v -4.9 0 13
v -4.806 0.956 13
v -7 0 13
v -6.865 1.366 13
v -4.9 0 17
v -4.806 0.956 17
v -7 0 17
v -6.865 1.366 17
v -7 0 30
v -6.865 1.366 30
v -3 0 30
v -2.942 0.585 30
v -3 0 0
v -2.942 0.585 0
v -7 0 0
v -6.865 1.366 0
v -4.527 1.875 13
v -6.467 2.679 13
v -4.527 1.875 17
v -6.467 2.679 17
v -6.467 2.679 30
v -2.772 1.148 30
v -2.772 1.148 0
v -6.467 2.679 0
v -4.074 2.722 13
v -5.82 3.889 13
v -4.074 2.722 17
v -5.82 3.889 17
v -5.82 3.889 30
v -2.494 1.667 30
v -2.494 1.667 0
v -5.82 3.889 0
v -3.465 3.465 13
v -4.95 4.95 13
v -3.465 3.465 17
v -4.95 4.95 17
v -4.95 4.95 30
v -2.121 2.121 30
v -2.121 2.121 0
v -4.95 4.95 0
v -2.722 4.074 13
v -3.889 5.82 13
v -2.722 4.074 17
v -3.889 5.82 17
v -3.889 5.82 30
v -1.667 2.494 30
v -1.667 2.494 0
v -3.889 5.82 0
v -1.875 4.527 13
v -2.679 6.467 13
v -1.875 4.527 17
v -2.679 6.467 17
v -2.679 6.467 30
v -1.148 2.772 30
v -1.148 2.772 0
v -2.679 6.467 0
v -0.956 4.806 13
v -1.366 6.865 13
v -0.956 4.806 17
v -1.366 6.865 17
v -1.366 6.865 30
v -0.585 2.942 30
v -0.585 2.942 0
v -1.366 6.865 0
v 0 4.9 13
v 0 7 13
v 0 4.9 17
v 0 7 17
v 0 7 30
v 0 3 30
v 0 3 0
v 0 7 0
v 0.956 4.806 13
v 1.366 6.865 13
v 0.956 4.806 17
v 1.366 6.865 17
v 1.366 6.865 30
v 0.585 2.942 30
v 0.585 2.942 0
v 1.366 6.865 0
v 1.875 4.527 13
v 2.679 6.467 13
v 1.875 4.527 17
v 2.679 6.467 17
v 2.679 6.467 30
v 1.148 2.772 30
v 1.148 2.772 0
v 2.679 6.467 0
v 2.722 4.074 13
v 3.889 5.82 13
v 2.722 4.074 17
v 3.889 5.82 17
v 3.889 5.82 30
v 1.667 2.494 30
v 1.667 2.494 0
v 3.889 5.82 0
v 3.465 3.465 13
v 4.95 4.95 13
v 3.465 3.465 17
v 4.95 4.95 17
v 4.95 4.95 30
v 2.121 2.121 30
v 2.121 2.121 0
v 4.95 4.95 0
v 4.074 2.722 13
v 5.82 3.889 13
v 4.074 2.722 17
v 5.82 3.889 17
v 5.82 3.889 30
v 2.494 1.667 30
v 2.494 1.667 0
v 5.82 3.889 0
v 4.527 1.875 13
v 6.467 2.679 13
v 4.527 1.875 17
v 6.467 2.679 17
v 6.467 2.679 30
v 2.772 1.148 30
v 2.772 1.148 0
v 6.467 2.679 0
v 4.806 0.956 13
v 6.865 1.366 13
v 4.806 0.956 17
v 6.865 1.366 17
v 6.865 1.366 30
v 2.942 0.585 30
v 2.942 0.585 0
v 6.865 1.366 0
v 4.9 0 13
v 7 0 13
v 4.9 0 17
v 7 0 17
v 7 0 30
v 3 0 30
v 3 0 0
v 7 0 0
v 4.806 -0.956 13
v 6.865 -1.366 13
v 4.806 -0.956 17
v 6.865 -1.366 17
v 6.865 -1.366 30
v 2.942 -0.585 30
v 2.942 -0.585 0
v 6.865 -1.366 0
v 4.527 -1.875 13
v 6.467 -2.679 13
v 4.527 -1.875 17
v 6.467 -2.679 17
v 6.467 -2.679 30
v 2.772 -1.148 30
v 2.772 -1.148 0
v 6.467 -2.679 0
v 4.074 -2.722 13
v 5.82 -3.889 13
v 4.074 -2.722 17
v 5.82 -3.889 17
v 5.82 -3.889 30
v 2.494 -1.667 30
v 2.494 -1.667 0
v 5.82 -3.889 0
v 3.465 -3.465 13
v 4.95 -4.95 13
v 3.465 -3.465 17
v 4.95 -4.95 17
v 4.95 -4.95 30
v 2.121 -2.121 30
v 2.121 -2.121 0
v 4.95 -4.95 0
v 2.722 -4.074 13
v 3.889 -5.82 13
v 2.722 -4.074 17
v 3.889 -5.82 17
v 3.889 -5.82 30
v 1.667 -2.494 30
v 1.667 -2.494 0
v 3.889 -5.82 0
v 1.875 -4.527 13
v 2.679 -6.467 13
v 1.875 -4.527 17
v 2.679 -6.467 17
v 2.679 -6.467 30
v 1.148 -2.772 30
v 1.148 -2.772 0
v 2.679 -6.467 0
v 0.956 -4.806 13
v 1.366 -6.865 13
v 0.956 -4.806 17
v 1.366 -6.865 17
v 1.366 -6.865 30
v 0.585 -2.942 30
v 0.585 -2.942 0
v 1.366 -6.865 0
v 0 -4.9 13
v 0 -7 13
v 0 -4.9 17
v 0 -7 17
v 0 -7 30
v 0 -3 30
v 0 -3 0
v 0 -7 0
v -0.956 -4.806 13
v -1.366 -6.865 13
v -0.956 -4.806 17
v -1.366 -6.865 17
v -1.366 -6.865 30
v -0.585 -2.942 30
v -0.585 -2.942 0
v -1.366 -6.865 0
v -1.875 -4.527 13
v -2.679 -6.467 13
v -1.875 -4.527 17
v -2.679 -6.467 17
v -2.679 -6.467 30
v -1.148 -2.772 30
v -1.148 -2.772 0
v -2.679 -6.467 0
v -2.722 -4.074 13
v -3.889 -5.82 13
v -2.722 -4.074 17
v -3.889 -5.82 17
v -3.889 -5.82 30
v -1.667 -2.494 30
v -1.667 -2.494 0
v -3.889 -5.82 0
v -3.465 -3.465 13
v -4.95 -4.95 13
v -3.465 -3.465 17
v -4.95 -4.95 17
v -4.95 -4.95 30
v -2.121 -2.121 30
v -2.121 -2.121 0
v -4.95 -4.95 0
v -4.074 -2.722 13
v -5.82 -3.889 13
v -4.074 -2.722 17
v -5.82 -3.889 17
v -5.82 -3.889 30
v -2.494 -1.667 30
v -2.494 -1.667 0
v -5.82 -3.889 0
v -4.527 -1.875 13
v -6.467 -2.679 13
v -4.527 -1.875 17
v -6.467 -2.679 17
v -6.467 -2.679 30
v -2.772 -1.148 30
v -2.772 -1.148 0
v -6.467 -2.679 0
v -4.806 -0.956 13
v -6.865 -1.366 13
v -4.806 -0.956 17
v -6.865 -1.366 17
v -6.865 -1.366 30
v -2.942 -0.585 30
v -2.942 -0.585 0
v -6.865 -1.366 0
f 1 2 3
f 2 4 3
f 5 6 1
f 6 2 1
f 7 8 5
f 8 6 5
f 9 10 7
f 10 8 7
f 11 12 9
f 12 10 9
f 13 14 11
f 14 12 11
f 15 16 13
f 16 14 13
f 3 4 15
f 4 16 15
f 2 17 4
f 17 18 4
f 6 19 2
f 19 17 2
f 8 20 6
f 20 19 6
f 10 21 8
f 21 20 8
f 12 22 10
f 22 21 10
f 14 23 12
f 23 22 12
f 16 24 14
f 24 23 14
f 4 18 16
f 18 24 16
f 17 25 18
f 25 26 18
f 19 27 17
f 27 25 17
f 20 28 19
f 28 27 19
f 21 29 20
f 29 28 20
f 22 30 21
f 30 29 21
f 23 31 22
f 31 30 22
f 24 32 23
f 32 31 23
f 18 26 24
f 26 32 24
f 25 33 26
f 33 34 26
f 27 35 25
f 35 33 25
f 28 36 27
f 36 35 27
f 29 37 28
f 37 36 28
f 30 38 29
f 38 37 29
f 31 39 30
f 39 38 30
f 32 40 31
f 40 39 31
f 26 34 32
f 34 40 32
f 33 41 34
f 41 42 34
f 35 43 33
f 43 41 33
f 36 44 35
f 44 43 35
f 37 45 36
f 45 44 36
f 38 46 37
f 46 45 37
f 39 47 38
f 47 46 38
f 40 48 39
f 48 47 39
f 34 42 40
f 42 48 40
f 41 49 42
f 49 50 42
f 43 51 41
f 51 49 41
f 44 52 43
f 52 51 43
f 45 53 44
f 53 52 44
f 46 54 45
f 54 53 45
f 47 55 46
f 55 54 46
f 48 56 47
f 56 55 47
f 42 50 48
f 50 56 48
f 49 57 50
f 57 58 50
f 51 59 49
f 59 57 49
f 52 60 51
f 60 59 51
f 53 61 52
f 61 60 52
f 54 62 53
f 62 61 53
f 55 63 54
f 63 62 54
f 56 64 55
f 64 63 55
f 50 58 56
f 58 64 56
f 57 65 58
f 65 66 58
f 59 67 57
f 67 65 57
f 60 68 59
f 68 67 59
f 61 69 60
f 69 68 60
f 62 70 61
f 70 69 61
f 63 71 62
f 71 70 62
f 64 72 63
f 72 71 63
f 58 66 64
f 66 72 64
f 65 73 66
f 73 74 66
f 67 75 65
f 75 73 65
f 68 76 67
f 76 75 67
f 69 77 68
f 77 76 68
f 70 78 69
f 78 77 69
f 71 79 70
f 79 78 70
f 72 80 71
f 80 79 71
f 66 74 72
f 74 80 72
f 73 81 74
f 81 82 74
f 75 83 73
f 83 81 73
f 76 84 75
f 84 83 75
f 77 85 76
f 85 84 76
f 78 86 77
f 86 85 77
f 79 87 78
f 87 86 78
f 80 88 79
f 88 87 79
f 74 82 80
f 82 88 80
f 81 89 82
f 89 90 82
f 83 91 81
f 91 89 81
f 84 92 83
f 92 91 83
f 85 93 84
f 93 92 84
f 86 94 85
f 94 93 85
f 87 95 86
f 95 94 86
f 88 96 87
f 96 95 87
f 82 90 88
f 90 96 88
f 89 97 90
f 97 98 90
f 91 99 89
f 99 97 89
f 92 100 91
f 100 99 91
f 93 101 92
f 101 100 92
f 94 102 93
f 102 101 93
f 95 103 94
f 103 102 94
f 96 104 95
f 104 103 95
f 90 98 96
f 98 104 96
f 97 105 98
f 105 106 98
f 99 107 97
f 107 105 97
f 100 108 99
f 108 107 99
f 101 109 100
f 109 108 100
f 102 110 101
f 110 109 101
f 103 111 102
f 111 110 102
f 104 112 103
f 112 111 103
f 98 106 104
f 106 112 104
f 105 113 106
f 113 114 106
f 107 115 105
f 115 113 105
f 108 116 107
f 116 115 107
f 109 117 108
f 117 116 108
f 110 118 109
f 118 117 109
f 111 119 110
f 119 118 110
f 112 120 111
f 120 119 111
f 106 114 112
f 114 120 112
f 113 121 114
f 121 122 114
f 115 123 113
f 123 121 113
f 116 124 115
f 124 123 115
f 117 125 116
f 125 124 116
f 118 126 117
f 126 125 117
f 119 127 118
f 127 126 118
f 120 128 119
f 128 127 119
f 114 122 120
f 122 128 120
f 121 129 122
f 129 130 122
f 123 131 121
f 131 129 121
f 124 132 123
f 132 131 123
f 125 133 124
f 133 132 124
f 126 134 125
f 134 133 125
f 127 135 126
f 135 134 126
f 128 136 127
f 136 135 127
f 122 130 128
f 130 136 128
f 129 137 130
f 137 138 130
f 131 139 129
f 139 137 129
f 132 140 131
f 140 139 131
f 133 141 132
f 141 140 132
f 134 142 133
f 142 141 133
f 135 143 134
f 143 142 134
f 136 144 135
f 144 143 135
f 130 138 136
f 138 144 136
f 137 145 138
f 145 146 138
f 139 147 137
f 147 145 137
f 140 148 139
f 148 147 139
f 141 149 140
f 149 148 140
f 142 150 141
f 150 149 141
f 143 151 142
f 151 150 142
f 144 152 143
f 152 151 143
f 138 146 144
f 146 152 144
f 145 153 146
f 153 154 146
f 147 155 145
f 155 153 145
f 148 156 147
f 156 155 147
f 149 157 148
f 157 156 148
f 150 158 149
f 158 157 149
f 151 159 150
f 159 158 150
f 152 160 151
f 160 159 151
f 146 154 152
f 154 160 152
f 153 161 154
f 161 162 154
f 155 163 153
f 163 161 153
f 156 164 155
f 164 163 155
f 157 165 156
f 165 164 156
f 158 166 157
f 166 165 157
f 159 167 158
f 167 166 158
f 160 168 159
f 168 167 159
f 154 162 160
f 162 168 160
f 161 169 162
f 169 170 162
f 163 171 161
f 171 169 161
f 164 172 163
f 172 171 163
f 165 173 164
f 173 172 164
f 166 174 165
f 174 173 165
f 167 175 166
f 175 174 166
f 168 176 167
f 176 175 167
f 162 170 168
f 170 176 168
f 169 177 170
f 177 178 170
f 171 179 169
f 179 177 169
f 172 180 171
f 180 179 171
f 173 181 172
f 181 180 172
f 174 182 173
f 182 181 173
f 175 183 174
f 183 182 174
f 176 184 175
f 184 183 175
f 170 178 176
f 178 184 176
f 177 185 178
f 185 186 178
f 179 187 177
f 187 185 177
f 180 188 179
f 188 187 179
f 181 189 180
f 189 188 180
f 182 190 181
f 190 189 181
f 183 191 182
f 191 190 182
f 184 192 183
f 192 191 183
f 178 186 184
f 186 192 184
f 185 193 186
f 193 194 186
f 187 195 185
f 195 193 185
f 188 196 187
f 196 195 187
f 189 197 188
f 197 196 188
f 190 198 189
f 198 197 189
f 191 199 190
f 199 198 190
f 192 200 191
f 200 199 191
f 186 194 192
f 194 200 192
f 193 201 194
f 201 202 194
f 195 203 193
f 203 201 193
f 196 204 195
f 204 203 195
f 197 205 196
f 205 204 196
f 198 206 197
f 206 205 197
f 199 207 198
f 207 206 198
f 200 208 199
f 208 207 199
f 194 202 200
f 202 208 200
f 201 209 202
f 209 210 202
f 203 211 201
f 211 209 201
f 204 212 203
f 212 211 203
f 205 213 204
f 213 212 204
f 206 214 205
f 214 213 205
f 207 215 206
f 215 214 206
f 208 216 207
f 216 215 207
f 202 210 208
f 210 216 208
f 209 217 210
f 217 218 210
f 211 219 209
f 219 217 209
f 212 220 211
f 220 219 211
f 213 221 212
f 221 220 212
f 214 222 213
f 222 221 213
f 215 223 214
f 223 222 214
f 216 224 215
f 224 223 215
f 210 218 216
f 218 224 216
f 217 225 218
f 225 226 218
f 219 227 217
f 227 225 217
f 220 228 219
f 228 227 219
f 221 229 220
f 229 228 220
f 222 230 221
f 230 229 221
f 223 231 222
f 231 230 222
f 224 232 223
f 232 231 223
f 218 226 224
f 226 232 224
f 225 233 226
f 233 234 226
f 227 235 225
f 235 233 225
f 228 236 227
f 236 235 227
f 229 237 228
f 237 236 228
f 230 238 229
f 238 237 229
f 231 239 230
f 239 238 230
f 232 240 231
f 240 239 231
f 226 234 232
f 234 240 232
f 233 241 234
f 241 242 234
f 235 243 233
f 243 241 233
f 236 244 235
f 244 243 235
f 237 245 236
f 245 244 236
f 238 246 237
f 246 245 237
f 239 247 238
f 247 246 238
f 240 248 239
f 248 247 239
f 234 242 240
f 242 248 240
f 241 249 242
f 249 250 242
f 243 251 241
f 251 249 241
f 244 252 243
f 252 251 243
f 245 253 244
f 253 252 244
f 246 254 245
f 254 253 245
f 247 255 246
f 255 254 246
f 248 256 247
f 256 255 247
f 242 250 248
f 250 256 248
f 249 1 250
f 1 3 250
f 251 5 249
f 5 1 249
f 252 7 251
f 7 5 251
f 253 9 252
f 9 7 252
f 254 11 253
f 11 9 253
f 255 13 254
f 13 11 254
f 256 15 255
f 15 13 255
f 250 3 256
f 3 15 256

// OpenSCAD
$fn = 32;

// ----------------------------------------------------------------------
// Grooved revolve: stepped, bore R3
// ----------------------------------------------------------------------

// --- parameters (mm) ---
bore_r = 3;               // bore radius
outer_r = 7;              // outer radius of the body
total_h = 30;             // overall height, Z
wall = 4;                 // radial wall thickness
groove_w = 4;             // groove width
groove_d = 2.1;           // groove depth
grooves = 1;              // number of outer grooves

bbox_x = 2 * outer_r;  // full diameter
bore_d = 2 * bore_r;  // bore diameter
body_d = 2 * outer_r;  // body diameter
revolve_angle = 360;  // full turn around the Z axis

profile = [[3, 0], [7, 0], [7, 13], [4.9, 13], [4.9, 17], [7, 17], [7, 30], [3, 30]];  // primary outline, 8 points, counter clockwise

// --- the one profile operation ---
rotate_extrude(angle = revolve_angle) polygon(points = profile);
